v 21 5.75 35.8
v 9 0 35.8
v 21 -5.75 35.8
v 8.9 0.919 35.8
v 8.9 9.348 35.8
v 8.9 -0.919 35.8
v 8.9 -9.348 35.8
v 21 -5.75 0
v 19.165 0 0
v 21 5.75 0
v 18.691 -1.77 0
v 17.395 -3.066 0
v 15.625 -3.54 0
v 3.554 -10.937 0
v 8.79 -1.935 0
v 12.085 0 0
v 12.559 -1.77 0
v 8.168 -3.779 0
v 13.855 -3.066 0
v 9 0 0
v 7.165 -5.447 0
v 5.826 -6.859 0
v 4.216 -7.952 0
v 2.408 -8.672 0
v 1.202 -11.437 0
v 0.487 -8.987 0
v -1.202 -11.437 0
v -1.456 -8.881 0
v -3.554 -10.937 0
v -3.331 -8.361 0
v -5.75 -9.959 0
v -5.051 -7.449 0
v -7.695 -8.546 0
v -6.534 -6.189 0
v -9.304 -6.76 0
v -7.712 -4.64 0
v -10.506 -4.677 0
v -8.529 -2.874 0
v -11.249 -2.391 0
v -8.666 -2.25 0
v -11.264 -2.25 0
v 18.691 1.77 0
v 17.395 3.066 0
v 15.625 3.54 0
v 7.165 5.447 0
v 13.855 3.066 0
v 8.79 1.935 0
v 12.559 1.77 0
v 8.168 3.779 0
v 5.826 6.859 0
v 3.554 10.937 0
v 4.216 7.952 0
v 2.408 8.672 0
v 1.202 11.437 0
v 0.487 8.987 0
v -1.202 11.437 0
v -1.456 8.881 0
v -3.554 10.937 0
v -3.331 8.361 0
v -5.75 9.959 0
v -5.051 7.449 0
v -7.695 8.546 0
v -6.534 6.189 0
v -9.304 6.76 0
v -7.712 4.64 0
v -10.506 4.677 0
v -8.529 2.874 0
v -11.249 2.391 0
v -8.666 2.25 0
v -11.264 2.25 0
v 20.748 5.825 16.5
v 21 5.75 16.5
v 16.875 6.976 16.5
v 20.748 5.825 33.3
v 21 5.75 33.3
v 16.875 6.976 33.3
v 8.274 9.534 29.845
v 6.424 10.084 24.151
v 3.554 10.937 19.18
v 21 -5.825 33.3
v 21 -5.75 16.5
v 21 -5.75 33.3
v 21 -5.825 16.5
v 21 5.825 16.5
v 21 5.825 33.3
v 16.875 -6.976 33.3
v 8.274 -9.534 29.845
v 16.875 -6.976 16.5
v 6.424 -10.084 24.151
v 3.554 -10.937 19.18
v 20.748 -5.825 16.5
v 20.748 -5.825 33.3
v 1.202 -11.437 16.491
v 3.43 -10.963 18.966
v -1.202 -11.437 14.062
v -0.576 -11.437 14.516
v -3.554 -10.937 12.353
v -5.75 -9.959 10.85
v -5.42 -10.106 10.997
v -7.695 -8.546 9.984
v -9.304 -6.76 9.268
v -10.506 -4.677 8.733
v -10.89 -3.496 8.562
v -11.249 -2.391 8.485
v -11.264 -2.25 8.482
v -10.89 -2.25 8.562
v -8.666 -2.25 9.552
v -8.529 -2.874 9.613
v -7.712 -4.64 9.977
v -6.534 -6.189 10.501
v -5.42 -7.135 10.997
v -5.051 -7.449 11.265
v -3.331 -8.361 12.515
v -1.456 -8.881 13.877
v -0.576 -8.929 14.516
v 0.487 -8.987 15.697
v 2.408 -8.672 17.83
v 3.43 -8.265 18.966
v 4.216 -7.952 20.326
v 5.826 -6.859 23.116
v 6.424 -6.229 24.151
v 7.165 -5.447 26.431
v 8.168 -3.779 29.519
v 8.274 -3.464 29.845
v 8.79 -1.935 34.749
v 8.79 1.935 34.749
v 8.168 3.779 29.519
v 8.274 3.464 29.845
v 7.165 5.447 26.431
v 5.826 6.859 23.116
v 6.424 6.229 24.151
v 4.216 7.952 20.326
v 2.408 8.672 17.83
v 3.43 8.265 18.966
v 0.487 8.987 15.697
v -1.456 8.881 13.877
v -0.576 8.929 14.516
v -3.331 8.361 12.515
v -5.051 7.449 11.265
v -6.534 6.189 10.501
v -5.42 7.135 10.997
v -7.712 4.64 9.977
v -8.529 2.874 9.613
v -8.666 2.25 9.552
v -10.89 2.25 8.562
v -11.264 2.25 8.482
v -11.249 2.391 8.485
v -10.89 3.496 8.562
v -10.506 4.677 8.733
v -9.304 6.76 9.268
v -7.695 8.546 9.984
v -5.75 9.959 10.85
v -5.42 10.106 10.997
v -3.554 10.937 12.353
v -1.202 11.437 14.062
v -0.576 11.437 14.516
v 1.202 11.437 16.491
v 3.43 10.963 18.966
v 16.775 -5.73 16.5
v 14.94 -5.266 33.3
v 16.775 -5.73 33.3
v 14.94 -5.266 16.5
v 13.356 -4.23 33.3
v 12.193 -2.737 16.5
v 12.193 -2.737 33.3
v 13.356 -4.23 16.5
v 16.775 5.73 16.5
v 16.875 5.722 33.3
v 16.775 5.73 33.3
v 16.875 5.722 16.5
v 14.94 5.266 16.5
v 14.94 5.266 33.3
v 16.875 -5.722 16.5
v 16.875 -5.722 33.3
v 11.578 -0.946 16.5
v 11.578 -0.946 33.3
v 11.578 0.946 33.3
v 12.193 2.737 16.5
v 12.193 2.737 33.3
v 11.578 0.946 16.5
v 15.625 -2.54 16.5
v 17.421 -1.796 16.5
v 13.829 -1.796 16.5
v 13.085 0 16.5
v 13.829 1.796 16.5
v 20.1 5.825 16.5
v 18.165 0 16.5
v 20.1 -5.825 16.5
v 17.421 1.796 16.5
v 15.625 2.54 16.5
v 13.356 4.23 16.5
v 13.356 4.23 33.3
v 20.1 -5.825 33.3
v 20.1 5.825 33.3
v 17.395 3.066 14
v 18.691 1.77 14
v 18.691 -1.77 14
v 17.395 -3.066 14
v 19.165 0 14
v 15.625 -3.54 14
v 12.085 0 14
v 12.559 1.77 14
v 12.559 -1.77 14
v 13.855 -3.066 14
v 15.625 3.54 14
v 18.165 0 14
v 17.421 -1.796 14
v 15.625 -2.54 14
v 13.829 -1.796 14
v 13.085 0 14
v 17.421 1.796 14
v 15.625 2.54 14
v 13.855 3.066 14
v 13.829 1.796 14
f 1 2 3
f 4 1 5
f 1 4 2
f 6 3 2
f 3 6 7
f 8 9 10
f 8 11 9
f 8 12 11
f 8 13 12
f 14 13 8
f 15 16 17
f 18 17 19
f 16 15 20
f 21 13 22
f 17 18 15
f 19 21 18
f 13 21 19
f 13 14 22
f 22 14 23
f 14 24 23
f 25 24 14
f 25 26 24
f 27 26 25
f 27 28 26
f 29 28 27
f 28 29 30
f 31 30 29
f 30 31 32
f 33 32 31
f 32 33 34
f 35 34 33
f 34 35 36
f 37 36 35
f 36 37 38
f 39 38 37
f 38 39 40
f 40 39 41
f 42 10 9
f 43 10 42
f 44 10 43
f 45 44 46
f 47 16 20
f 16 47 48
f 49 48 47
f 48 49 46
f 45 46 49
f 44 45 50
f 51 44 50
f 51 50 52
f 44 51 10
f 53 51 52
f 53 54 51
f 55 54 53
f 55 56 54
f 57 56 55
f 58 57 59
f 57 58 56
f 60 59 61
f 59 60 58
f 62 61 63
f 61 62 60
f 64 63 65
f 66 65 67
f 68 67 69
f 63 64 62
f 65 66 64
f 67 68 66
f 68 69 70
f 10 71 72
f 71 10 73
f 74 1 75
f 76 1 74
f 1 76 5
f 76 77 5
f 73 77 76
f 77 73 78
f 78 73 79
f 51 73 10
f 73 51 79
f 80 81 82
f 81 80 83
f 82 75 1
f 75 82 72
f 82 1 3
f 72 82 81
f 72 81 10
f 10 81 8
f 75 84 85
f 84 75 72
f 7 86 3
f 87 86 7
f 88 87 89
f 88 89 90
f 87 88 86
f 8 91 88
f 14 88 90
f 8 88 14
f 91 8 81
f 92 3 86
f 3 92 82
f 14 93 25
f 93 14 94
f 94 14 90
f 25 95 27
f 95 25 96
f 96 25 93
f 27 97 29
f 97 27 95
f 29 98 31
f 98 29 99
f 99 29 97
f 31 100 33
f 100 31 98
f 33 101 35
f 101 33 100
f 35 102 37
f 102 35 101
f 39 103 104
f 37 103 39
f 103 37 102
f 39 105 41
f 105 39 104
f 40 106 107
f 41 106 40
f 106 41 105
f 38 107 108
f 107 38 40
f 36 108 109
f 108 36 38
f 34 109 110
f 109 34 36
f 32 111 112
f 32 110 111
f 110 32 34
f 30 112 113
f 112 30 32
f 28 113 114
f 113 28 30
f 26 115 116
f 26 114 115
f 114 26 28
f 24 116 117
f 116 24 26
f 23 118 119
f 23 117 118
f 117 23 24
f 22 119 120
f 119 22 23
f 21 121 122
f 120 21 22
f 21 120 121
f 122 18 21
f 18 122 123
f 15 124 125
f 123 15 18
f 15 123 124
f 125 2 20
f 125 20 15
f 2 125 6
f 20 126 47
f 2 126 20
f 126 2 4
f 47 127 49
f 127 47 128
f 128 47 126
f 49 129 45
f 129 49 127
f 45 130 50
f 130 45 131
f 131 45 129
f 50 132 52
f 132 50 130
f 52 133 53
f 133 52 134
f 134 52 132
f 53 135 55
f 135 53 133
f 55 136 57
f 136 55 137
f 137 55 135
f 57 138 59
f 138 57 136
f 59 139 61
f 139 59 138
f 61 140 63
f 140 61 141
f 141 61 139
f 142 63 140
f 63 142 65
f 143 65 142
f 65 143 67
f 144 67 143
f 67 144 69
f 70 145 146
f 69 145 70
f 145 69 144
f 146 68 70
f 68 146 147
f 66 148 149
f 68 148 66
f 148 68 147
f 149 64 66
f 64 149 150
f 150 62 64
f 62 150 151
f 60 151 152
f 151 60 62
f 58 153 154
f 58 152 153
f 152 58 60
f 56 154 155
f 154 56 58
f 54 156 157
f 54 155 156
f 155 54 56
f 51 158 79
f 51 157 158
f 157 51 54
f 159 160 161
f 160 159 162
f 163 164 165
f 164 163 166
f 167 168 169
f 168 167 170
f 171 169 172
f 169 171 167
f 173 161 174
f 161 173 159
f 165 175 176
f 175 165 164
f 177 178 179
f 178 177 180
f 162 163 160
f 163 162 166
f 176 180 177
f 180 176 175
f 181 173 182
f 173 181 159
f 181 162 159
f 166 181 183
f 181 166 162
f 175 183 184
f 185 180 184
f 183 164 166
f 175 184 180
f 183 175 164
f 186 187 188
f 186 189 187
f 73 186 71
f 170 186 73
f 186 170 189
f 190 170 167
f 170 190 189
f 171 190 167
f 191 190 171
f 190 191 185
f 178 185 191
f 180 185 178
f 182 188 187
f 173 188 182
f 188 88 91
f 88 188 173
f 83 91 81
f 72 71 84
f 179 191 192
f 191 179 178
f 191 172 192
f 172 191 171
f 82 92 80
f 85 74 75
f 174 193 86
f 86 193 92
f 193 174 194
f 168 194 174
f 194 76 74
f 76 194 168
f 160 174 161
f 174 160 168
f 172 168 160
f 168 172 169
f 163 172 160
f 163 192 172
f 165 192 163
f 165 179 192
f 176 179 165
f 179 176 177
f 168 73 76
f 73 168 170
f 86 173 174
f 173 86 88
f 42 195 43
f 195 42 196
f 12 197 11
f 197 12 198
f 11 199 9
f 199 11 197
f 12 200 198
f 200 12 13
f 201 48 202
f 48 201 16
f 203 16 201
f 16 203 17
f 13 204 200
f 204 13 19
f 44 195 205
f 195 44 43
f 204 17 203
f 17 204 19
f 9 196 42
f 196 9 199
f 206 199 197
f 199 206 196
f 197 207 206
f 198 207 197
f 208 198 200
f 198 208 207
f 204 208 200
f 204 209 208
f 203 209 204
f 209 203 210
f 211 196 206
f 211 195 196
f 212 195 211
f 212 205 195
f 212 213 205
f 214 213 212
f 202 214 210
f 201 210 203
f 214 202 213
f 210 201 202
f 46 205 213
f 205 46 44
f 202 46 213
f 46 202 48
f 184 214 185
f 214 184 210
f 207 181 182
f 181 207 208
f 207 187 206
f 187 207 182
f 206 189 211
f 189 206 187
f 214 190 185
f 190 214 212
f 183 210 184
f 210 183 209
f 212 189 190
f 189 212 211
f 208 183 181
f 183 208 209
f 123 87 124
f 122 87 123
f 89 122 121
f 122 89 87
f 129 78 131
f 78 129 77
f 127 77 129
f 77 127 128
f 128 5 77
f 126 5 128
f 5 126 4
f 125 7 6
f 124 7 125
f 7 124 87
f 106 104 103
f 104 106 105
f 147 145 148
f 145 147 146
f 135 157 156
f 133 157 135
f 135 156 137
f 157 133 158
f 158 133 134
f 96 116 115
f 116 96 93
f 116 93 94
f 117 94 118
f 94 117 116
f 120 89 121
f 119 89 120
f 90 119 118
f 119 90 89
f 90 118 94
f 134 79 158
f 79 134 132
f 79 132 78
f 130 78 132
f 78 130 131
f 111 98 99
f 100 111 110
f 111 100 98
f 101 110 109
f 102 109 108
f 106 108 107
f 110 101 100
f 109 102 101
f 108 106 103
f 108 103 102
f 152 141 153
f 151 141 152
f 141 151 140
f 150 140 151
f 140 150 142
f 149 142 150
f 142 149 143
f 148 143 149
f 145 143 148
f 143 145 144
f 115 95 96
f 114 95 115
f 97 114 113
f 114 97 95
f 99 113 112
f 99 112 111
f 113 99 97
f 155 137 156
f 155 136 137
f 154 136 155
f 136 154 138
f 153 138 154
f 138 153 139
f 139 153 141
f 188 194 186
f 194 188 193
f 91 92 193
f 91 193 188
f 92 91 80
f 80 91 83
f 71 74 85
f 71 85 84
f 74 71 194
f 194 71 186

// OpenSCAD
fingerWidth = 18; 
// your button cell's diameter.  (LR44 is 11.5)
batteryWidth = 11.5;  
// your button cell's height.  
batteryHeight = 5.6; 	
// need about 5 volts to work a laser, usually 3 batteries should do it.
batteryCount = 3; 		
// laser module's diameter
laserWidth = 7.08; 	
// laser modules length
laserHeight = 14;		
// how thick the walls are
thickness= 2.5;

batterySlot  = batteryHeight *batteryCount;
ringLength = (batterySlot) +( laserHeight+ thickness*2 );

translate([0,0,ringLength ] ) rotate([180, 0, 0]) laserRing();

module laserRing(){

	
	difference(){
		linear_extrude(height = ringLength) {
			face();
		}
		
		//battery slot
		translate([fingerWidth/2 + batteryWidth/2 +thickness  ,0,thickness]){
			cylinder(r = batteryWidth/2,  h = batterySlot  );
		
		}
		translate([fingerWidth/2 +batteryWidth/2 + thickness*2   ,0,thickness+ batterySlot/2]){
				cube([batteryWidth/2, batteryWidth*2, batterySlot], center=true);
			
		}
		//Laser Slot
		translate([fingerWidth/2 + batteryWidth/4 +thickness*1.5,0 ,thickness*2 +batterySlot  ]){
			cylinder(r=laserWidth/2, h =laserHeight );			
		}
		translate([fingerWidth/2 + batteryWidth/4 +thickness*1.5  ,0,thickness+batterySlot ]){
			cylinder(r=laserWidth/2-1, h =laserHeight +thickness);			
		}
		
		//
		translate([-(ringLength * .6)/2 - fingerWidth/2, 50, 0] ) rotate([90, 0, 0])
		cylinder(r = ringLength * .8, h = 100);
		
	}
	//support
	translate([fingerWidth/2 +batteryWidth/2 + thickness*2+ .8, 0, thickness+ batterySlot/2])
		cube([.9, batteryWidth/2 +thickness*2+.9, batterySlot], center = true) ;
}

module face(){

	difference(){
		hull(){	
			circle(r = fingerWidth/2 + thickness)  ;
			
			translate([ fingerWidth/2 + thickness/2, -(batteryWidth )/2, 0])
			square([batteryWidth/2 +thickness*2, (batteryWidth )]);
		}
		circle(r = fingerWidth/2);	
		translate([-fingerWidth/2, 0, 0]){
			square([fingerWidth,fingerWidth*.25], center = true);
		}
		
	}

}
